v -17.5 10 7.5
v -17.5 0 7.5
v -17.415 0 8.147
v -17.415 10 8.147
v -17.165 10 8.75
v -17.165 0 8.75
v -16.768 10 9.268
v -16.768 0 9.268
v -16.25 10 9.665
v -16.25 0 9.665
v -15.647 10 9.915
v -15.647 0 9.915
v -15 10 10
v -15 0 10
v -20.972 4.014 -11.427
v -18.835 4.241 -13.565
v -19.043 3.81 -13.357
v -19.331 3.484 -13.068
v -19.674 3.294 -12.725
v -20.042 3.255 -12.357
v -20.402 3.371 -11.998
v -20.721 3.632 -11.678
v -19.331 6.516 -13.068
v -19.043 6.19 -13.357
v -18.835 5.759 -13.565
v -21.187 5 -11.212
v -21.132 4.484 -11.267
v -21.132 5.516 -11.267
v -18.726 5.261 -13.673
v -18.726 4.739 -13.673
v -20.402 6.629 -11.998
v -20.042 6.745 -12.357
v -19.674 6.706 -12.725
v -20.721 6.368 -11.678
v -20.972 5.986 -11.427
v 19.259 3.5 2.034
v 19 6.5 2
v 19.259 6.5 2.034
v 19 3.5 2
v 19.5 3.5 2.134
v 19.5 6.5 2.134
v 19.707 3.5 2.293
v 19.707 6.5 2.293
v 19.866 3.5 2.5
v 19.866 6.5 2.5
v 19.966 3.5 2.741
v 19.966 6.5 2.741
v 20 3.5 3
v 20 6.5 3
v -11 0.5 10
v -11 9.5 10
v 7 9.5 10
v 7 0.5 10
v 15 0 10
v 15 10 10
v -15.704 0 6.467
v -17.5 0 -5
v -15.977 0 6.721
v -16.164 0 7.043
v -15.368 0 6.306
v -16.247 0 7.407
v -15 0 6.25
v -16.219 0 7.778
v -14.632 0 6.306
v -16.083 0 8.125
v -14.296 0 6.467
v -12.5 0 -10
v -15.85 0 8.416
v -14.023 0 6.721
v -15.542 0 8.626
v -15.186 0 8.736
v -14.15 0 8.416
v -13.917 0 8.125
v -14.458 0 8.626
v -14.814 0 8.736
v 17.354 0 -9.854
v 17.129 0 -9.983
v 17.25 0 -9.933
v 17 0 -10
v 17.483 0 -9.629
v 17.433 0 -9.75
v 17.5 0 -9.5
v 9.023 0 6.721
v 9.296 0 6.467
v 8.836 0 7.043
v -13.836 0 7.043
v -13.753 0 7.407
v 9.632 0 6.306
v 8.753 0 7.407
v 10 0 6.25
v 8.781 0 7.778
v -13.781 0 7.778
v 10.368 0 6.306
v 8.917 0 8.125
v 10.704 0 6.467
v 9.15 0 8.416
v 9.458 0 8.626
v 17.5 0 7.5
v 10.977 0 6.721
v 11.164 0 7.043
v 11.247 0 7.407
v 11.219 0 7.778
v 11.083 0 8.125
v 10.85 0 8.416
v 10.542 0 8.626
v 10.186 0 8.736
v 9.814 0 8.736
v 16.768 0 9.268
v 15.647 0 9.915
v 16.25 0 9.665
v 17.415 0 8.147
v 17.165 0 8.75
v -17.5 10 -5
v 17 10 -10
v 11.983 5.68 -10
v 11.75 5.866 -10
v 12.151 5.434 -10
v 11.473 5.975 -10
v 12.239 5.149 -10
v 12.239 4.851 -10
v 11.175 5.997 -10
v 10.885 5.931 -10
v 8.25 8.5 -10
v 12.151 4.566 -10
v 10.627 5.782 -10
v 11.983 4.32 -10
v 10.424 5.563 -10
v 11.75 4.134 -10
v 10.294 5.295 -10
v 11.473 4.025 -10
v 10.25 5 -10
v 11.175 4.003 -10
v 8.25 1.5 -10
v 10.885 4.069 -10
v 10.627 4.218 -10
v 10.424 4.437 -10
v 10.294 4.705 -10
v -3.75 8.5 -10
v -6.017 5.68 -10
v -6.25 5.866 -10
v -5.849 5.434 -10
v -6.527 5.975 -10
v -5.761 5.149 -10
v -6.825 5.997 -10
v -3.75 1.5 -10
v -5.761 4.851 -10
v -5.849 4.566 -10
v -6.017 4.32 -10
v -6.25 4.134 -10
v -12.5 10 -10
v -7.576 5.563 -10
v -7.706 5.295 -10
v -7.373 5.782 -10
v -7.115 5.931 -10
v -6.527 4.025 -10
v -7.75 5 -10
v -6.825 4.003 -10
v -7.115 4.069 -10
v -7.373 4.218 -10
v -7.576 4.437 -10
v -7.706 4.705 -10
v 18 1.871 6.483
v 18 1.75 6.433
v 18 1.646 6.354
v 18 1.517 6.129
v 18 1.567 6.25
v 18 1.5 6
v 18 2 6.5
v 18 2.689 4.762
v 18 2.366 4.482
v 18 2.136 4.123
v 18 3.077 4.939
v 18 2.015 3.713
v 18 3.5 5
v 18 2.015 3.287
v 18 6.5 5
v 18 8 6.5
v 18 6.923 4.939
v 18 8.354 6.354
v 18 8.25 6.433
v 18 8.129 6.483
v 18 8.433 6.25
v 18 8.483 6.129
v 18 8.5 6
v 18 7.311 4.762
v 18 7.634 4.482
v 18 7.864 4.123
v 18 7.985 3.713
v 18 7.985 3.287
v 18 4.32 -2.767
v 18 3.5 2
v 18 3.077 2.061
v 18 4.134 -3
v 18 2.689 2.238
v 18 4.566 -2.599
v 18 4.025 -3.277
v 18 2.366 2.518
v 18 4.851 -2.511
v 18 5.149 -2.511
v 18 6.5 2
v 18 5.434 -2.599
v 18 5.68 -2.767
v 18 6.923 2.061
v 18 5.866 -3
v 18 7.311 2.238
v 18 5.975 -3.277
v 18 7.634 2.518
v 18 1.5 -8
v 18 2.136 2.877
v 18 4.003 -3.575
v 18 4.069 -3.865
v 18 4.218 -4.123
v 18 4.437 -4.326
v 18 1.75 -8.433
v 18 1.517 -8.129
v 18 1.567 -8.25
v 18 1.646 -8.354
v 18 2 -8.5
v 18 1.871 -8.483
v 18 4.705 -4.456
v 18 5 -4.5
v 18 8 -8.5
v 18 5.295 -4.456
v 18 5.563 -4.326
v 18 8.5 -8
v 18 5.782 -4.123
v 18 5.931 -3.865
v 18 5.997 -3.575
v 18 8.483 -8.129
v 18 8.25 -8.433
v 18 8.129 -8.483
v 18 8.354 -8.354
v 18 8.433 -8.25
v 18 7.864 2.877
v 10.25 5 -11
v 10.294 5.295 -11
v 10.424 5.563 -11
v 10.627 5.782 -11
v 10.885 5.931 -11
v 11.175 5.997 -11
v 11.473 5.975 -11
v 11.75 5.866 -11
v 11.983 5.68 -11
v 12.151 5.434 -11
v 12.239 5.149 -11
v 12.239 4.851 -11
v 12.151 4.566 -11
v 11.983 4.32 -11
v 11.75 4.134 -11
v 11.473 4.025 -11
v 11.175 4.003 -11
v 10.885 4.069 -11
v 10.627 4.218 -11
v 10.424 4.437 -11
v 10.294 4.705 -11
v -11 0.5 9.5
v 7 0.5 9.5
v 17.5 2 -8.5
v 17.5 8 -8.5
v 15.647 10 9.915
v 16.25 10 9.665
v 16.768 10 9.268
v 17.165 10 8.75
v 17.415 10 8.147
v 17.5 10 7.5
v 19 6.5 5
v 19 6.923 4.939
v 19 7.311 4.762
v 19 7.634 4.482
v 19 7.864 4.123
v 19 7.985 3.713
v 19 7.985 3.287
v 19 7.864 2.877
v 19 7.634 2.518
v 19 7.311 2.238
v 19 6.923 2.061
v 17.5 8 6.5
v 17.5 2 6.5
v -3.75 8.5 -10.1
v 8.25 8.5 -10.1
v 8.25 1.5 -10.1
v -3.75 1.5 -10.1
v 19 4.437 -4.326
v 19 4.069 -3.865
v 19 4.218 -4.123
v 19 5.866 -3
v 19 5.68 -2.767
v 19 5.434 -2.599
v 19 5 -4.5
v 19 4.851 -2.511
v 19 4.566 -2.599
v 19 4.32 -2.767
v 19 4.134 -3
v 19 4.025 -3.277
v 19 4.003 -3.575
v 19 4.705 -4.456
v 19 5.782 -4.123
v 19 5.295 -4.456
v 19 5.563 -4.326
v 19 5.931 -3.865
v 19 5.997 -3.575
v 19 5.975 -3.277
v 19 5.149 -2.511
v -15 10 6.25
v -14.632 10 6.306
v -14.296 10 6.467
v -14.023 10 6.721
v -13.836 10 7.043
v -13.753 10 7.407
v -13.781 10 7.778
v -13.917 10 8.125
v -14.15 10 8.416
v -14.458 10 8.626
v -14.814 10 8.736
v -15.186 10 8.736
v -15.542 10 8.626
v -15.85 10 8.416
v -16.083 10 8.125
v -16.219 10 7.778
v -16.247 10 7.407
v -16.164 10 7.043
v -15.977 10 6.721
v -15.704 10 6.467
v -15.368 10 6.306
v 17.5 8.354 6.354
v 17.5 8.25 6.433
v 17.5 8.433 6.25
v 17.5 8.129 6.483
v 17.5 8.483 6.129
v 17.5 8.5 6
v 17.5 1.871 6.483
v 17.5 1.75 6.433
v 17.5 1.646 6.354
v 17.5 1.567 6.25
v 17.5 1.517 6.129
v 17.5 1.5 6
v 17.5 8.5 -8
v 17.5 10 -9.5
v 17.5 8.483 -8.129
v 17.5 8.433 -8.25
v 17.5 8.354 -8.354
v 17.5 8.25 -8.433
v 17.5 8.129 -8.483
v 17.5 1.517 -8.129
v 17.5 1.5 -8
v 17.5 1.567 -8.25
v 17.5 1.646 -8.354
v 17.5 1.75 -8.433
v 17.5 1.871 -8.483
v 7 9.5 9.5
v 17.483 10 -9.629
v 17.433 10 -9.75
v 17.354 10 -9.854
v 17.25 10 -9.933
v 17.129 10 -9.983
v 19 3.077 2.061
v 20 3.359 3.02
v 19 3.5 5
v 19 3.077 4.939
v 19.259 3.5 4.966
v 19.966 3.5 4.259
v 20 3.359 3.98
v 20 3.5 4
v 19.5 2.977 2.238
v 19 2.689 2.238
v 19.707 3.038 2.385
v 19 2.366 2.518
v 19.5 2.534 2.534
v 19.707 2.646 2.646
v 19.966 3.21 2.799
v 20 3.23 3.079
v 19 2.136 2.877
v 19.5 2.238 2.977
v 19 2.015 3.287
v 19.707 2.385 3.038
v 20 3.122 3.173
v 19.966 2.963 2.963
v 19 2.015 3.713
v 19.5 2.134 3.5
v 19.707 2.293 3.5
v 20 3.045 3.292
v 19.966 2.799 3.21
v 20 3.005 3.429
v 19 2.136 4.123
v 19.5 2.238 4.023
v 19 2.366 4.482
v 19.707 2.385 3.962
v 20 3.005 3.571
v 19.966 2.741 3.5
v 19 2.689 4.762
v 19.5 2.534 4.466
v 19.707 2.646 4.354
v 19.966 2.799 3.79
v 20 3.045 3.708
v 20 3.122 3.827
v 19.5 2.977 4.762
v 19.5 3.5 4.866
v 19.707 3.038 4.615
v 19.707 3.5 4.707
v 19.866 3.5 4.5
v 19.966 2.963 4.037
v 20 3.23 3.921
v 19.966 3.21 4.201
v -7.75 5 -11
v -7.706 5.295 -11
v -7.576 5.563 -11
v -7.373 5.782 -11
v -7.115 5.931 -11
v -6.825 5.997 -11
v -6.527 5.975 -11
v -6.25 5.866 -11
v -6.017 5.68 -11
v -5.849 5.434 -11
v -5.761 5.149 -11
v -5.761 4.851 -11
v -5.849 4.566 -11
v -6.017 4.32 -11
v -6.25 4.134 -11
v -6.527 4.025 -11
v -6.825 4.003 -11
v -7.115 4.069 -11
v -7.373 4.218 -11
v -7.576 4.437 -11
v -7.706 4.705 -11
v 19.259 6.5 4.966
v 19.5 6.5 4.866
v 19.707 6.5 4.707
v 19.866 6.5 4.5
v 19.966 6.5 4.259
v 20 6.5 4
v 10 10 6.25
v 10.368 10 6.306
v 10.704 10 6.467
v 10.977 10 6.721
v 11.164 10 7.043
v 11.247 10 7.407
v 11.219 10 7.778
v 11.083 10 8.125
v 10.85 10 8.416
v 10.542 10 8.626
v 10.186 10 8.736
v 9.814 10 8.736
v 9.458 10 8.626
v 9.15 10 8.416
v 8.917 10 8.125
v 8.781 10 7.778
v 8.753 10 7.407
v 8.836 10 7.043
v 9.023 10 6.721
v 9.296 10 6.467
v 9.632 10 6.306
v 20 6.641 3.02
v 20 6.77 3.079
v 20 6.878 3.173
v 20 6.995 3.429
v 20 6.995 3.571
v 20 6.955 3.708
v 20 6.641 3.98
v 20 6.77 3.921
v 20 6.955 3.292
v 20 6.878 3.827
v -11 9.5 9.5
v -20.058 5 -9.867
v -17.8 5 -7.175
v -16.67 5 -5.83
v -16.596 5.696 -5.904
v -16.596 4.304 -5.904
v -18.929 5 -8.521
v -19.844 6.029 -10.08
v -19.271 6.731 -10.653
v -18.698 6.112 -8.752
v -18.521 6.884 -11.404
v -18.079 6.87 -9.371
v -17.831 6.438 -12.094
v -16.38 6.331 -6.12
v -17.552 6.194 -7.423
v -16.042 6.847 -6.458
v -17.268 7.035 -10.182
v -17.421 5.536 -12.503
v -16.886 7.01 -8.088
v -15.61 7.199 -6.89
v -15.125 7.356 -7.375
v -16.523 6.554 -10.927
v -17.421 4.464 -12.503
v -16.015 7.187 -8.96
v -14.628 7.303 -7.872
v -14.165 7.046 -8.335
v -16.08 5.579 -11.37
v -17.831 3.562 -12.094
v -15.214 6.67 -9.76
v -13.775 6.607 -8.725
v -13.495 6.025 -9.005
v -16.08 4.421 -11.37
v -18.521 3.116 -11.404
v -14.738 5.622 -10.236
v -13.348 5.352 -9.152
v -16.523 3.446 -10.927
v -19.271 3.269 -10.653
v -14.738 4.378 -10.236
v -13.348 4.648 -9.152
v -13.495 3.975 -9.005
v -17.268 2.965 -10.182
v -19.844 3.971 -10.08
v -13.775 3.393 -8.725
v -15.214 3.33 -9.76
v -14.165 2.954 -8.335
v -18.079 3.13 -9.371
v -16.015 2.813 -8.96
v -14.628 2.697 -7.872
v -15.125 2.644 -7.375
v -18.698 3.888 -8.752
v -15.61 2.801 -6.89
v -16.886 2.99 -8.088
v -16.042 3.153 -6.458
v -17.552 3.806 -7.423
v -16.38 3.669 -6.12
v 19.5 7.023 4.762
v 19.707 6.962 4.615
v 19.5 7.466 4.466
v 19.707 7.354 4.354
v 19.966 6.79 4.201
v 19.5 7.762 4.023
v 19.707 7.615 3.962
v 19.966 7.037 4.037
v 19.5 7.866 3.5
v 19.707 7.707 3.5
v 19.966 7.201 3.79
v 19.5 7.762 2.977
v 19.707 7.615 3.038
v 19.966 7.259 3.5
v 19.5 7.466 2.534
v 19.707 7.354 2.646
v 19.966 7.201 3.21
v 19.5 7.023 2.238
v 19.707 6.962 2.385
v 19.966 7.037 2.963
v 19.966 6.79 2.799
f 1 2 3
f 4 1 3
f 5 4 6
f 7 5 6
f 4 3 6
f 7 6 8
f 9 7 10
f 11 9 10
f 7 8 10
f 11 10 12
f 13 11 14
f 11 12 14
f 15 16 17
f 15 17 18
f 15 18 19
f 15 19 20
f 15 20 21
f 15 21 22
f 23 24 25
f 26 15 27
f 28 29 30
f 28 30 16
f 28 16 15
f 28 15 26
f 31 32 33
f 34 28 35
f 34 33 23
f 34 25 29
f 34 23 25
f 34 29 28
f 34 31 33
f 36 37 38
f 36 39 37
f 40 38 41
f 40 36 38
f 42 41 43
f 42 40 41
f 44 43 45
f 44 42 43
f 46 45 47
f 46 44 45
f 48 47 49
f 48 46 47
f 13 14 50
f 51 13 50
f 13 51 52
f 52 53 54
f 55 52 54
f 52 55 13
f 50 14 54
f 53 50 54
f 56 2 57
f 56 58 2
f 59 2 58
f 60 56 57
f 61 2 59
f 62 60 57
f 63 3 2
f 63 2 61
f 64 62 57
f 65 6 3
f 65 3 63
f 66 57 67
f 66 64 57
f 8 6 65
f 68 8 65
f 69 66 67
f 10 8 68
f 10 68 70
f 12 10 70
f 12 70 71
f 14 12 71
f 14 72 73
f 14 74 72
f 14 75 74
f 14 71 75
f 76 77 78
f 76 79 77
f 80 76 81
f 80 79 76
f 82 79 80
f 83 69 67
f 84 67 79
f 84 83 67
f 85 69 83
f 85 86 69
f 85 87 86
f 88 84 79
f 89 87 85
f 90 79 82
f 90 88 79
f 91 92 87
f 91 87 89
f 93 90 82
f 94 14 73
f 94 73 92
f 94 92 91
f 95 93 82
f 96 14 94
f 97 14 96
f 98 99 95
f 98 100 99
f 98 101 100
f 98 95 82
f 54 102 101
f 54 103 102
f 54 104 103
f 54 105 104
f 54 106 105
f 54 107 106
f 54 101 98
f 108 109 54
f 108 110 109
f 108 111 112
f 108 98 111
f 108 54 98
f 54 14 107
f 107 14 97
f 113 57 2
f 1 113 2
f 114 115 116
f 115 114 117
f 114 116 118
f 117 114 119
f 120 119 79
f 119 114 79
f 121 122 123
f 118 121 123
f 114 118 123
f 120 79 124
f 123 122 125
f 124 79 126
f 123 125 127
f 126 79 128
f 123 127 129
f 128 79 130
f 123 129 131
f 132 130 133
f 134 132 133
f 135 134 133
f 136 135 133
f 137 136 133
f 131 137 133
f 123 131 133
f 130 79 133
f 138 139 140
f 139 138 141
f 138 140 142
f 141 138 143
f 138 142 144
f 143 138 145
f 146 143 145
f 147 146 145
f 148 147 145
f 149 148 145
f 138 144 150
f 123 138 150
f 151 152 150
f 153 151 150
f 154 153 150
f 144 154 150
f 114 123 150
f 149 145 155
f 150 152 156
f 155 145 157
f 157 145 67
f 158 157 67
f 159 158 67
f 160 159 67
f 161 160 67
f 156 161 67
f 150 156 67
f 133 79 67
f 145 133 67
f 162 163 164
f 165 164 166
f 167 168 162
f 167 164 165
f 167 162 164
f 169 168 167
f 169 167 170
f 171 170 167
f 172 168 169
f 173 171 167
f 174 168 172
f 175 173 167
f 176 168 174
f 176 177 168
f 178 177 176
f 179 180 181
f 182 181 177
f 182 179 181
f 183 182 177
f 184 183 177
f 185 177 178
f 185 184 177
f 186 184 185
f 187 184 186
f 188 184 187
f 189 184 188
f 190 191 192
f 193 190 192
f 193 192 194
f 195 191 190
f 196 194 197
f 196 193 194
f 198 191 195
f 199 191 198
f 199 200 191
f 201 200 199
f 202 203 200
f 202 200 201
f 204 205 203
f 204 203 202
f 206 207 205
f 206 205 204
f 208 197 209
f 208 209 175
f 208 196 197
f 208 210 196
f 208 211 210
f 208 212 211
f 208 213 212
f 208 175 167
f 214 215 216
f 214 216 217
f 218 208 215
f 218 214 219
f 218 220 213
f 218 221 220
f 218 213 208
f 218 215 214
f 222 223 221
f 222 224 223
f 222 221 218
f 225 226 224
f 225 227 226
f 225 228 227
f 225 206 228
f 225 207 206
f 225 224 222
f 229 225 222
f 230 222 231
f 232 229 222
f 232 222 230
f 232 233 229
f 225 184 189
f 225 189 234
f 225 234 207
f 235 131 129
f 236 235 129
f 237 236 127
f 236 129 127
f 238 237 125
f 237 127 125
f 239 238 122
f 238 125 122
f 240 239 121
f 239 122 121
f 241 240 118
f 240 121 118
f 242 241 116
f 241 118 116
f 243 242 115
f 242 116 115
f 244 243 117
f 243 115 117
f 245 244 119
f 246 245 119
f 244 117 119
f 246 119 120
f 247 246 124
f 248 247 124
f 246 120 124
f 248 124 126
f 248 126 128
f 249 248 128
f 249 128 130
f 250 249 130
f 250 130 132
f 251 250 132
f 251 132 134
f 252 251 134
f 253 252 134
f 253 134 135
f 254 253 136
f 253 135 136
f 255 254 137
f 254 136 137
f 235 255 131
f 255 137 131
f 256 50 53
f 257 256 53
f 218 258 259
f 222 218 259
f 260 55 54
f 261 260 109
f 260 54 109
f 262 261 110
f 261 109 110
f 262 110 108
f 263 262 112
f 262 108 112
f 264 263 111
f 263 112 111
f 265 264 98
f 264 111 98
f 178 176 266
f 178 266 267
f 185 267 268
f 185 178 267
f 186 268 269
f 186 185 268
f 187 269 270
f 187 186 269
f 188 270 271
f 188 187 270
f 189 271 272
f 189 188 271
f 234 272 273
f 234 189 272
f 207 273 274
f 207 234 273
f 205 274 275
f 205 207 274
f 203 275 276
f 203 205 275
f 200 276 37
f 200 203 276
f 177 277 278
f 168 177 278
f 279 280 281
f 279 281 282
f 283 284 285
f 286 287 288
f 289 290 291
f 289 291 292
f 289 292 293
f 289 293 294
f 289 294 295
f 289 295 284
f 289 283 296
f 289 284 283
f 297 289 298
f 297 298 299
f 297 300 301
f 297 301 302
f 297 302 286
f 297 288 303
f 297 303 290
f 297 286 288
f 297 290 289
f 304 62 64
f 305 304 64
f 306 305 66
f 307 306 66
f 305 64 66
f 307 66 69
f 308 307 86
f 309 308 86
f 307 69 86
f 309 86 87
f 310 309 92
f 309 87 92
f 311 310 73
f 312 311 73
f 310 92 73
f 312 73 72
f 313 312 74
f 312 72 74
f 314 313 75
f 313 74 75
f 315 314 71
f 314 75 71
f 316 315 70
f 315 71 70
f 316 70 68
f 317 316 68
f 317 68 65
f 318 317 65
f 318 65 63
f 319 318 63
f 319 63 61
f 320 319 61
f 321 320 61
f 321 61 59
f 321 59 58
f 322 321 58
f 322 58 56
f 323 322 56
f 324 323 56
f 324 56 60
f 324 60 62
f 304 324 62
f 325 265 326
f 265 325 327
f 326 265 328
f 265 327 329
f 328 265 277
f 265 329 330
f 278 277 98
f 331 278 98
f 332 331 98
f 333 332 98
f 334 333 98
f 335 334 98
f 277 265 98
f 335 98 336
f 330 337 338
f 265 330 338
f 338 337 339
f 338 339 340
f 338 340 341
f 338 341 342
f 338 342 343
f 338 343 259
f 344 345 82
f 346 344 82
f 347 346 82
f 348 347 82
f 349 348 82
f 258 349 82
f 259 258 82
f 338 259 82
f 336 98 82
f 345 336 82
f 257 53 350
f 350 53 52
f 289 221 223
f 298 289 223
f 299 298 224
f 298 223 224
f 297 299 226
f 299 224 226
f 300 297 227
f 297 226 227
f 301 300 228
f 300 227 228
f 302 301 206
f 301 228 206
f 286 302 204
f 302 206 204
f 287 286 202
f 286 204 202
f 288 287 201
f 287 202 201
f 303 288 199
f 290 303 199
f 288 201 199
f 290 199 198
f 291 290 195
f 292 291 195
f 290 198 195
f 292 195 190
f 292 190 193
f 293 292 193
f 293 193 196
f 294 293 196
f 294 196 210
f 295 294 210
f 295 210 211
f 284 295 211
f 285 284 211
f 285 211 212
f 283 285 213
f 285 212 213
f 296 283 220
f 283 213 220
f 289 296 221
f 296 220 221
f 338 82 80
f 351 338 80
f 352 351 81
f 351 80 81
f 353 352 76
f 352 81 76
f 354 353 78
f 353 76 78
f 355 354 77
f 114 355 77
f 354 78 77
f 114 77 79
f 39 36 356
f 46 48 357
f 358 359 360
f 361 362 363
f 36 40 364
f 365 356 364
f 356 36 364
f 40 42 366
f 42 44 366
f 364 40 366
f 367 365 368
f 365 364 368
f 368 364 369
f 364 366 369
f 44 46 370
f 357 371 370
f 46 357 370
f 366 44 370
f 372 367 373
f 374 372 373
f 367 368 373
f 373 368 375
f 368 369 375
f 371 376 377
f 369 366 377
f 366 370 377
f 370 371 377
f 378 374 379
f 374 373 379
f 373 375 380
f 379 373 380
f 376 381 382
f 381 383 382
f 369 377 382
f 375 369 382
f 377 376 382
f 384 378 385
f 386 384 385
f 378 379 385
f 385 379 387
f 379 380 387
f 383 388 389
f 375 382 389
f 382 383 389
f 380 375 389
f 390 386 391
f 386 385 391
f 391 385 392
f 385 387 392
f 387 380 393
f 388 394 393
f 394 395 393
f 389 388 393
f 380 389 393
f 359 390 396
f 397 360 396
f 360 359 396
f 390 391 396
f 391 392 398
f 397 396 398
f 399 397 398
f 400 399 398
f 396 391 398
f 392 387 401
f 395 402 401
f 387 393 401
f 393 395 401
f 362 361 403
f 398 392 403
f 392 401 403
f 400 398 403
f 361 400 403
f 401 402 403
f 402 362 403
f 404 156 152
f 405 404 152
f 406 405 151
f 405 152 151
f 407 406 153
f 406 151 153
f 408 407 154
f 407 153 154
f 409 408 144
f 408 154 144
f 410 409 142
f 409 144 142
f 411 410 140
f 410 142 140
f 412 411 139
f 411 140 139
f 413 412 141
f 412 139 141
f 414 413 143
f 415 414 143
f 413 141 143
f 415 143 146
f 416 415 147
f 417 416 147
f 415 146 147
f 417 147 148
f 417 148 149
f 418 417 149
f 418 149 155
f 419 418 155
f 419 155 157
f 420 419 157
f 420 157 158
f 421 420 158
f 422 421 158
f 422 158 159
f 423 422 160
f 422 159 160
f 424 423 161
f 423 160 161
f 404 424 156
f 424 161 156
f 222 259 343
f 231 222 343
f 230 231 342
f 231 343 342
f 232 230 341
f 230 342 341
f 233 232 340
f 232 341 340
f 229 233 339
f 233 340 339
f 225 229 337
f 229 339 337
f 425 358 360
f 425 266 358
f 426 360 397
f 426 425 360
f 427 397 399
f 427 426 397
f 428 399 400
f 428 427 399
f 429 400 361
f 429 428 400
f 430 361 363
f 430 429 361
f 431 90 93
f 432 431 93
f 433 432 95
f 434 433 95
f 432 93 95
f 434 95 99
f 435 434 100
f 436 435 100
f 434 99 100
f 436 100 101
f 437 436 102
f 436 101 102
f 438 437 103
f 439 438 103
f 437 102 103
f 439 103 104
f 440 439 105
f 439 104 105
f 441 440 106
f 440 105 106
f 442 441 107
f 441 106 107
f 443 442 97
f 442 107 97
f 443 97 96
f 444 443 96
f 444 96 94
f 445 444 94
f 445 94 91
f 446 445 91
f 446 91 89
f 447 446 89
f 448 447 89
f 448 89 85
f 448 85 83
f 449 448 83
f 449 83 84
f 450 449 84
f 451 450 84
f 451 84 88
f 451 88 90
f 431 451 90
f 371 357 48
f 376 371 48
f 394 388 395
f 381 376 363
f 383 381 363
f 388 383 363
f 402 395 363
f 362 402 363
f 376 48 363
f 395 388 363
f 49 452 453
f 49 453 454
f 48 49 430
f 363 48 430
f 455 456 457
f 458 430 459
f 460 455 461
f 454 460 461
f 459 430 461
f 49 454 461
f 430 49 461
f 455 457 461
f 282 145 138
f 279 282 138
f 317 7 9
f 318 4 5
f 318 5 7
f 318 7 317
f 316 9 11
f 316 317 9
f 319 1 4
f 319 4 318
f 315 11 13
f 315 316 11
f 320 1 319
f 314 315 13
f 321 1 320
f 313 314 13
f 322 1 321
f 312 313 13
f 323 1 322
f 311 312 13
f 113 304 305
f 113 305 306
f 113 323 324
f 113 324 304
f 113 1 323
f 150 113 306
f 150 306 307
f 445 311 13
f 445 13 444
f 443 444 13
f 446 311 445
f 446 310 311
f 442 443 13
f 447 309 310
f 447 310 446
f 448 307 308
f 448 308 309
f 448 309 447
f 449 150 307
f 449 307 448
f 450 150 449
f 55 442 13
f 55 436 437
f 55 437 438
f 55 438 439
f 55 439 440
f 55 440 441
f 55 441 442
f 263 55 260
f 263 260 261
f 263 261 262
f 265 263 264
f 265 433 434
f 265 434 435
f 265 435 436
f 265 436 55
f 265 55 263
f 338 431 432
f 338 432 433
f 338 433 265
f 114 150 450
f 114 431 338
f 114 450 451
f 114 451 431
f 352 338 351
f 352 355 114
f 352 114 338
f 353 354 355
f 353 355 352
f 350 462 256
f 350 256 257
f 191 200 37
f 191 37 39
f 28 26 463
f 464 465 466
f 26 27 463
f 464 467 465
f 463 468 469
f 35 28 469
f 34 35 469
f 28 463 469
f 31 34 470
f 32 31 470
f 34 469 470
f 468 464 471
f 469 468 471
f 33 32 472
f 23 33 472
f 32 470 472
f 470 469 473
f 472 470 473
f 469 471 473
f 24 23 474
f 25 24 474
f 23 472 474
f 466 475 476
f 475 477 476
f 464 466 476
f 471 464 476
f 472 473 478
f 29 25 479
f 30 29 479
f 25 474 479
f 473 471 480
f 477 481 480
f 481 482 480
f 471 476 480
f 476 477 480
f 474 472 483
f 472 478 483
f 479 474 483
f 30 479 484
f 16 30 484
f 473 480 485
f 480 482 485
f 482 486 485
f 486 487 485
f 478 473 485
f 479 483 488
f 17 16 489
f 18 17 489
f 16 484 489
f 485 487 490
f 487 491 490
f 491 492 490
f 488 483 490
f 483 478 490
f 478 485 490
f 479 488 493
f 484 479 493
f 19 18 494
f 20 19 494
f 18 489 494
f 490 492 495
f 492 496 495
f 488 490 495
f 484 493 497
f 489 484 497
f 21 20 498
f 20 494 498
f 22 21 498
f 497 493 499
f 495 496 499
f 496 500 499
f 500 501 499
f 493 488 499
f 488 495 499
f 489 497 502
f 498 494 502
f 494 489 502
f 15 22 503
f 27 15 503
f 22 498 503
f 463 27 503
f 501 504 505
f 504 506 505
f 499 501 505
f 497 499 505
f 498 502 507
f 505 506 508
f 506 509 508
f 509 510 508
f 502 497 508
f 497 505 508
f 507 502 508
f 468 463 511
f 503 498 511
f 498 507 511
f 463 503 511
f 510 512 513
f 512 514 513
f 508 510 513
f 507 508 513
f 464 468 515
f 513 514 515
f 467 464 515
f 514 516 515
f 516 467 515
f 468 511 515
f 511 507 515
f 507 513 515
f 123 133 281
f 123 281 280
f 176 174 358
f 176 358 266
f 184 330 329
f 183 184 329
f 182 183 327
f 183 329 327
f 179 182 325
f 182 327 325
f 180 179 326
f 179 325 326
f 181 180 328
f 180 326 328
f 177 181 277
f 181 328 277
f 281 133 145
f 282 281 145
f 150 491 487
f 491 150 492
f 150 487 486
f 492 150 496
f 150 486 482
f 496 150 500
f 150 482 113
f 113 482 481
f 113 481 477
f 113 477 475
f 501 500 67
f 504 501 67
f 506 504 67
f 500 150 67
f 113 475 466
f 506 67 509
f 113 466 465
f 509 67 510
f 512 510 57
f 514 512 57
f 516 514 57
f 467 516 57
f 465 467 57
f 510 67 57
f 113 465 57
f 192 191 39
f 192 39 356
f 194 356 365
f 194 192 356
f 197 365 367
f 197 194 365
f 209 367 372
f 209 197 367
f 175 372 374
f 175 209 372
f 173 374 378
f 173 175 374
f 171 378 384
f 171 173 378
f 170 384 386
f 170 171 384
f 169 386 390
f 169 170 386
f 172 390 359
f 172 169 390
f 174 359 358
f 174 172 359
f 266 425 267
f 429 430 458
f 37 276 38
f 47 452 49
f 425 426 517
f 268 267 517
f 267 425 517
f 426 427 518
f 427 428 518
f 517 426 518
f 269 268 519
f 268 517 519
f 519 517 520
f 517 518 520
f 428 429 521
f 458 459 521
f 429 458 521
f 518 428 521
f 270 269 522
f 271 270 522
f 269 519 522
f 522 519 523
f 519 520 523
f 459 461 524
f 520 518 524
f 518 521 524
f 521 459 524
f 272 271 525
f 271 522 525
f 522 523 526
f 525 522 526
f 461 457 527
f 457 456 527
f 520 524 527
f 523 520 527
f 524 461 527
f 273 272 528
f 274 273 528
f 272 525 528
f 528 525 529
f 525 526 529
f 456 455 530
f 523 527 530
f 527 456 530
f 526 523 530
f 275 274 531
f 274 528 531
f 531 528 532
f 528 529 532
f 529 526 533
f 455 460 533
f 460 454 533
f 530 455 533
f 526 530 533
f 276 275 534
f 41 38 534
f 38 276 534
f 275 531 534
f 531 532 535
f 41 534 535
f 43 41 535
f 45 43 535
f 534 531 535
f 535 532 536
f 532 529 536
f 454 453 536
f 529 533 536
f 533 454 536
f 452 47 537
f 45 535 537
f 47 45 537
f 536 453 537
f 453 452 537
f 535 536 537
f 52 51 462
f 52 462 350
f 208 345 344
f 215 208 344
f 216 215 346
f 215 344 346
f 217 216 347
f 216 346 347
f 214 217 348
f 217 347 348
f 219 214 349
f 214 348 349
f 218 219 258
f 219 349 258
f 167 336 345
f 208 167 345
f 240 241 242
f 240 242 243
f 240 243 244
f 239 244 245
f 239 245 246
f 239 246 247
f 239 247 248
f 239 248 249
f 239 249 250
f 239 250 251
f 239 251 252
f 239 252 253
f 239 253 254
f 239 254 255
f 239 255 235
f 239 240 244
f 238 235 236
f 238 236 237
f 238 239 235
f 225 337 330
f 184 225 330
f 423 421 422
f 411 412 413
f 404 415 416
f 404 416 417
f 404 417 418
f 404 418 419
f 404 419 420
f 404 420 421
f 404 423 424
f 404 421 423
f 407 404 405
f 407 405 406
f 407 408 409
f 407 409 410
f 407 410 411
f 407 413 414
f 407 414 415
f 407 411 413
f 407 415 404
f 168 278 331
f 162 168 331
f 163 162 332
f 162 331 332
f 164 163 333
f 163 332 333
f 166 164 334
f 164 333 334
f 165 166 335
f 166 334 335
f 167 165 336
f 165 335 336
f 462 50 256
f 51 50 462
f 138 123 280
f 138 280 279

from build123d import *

# Parameters (mm, degrees)
SKETCH_1_R             = 0.5
EXTRUDE_1_DEPTH        = 10
HOLE_WIZARD_M3_1_D     = 2.5
HOLE_WIZARD_M3_1_DEPTH = 18.5
HOLE_WIZARD_M3_1_TIP   = 0.751075774
SKETCH_4_R             = 0.5
EXTRUDE_2_DEPTH        = 10
HOLE_WIZARD_M3_2_D     = 2.5
HOLE_WIZARD_M3_2_DEPTH = 18.5
HOLE_WIZARD_M3_2_TIP   = 0.751075774
SKETCH_6_W             = 18
SKETCH_6_H             = 9
CUT_EXTRUDE_1_DEPTH    = 0.5
EXTRUDE_3_DEPTH        = 0.5
EXTRUDE_4_DEPTH        = 2
FILLET_4_R             = 1
SKETCH_10_R            = 1
EXTRUDE_5_DEPTH        = 1
SKETCH_11_W            = 12
SKETCH_11_H            = 7
EXTRUDE_6_DEPTH        = 0.1
SKETCH_12_R            = 1
EXTRUDE_7_DEPTH        = 1
SKETCH_13_R            = 1.75
EXTRUDE_8_DEPTH        = 7
DRAFT_1_ANGLE          = 5


with BuildPart() as part:
    # 草图1 → 凸台-拉伸1 (new body)
    with BuildSketch(Plane(origin=(0, 0, 0), x_dir=(1, 0, 0), z_dir=(0, 1, 0))):
        with BuildLine():
            Line((-12.5, 10), (-17.5, 5))
            Line((-17.5, 5), (-17.5, -7.5))
            ThreePointArc((-17.5, -7.5), (-16.767766953, -9.267766953), (-15, -10))
            Line((-15, -10), (15, -10))
            ThreePointArc((15, -10), (16.767766953, -9.267766953), (17.5, -7.5))
            Line((17.5, -7.5), (17.5, 9.5))
            ThreePointArc((17.5, 9.5), (17.353553391, 9.853553391), (17, 10))
            Line((17, 10), (-12.5, 10))
        make_face()
        with Locations((-15, -7.5)):
            Circle(SKETCH_1_R, mode=Mode.SUBTRACT)
    extrude(amount=EXTRUDE_1_DEPTH)

    # M3 螺纹孔1
    with Locations(Plane(origin=(10, 10, 7.5), x_dir=(0, 0, 1), z_dir=(0, 1, 0))):
        with Locations((0, 0)):
            Hole(HOLE_WIZARD_M3_1_D / 2, depth=HOLE_WIZARD_M3_1_DEPTH)
            with Locations((0, 0, -(HOLE_WIZARD_M3_1_DEPTH + HOLE_WIZARD_M3_1_TIP / 2))):  # 118° drill point
                Cone(0, HOLE_WIZARD_M3_1_D / 2, HOLE_WIZARD_M3_1_TIP, mode=Mode.SUBTRACT)

    # 草图4 → 凸台-拉伸2 (add)
    with BuildSketch(Plane.XZ):
        with Locations((-15, 7.5)):
            Circle(SKETCH_4_R)
    extrude(amount=-EXTRUDE_2_DEPTH)

    # M3 螺纹孔2
    with Locations(Plane(origin=(-15, 10, 7.5), x_dir=(0, 0, 1), z_dir=(0, 1, 0))):
        with Locations((0, 0)):
            Hole(HOLE_WIZARD_M3_2_D / 2, depth=HOLE_WIZARD_M3_2_DEPTH)
            with Locations((0, 0, -(HOLE_WIZARD_M3_2_DEPTH + HOLE_WIZARD_M3_2_TIP / 2))):  # 118° drill point
                Cone(0, HOLE_WIZARD_M3_2_D / 2, HOLE_WIZARD_M3_2_TIP, mode=Mode.SUBTRACT)

    # 草图6 → 切除-拉伸1 (cut)
    with BuildSketch(Plane.XY.offset(10)):
        with Locations((-2, 5)):
            Rectangle(SKETCH_6_W, SKETCH_6_H)
    extrude(amount=-CUT_EXTRUDE_1_DEPTH, mode=Mode.SUBTRACT)

    # 草图8 → 凸台-拉伸3 (add)
    with BuildSketch(Plane(origin=(17.5, 0, 0), x_dir=(0, 0, -1), z_dir=(1, 0, 0))):
        with BuildLine():
            Line((8, 8.5), (-6, 8.5))
            ThreePointArc((-6, 8.5), (-6.353553391, 8.353553391), (-6.5, 8))
            Line((-6.5, 8), (-6.5, 2))
            ThreePointArc((-6.5, 2), (-6.353553391, 1.646446609), (-6, 1.5))
            Line((-6, 1.5), (8, 1.5))
            ThreePointArc((8, 1.5), (8.353553391, 1.646446609), (8.5, 2))
            Line((8.5, 2), (8.5, 8))
            ThreePointArc((8.5, 8), (8.353553391, 8.353553391), (8, 8.5))
        make_face()
    extrude(amount=EXTRUDE_3_DEPTH)

    # 草图9 → 凸台-拉伸4 (add)
    with BuildSketch(Plane(origin=(18, 0, 0), x_dir=(0, 0, -1), z_dir=(1, 0, 0))):
        with BuildLine():
            Line((-2, 6.5), (-2, 3.5))
            ThreePointArc((-2, 3.5), (-3.5, 2), (-5, 3.5))
            Line((-5, 3.5), (-5, 6.5))
            ThreePointArc((-5, 6.5), (-3.5, 8), (-2, 6.5))
        make_face()
    extrude(amount=EXTRUDE_4_DEPTH)

    # 圆角4
    fillet_4_edges = [part.edges().sort_by_distance(p)[0] for p in [
        (20, 8, 3.5),
        (20, 5, 5),
        (20, 2, 3.5),
        (20, 5, 2),
    ]]
    fillet(fillet_4_edges, radius=FILLET_4_R)

    # 草图10 → 凸台-拉伸5 (add)
    with BuildSketch(Plane(origin=(18, 0, 0), x_dir=(0, 0, -1), z_dir=(1, 0, 0))):
        with Locations((3.5, 5)):
            Circle(SKETCH_10_R)
    extrude(amount=EXTRUDE_5_DEPTH)

    # 草图11 → 凸台-拉伸6 (add)
    with BuildSketch(Plane(origin=(0, 0, -10), x_dir=(-1, 0, 0), z_dir=(0, 0, -1))):
        with Locations((-2.25, 5)):
            Rectangle(SKETCH_11_W, SKETCH_11_H)
    extrude(amount=EXTRUDE_6_DEPTH)

    # 草图12 → 凸台-拉伸7 (add)
    with BuildSketch(Plane(origin=(0, 0, -10), x_dir=(-1, 0, 0), z_dir=(0, 0, -1))):
        with Locations((-11.25, 5)):
            Circle(SKETCH_12_R)
        with Locations((6.75, 5)):
            Circle(SKETCH_12_R)
    extrude(amount=EXTRUDE_7_DEPTH)

    # 草图13 → 凸台-拉伸8 (add)
    with BuildSketch(Plane(origin=(-11.25, 0, -11.25), x_dir=(-0.707106781, 0, 0.707106781), z_dir=(-0.707106781, 0, -0.707106781))):
        with Locations((5.303300859, 5)):
            Circle(SKETCH_13_R)
    extrude(amount=EXTRUDE_8_DEPTH)

    # 拔模1
    draft_1_faces = [part.faces().sort_by_distance(p)[0] for p in [
        (-16.237436867, 5, -11.212310601),
    ]]
    draft(draft_1_faces, Plane(origin=(-19.949747468, 5, -12.449747468), x_dir=(-0.707106781, 0, 0.707106781), z_dir=(-0.707106781, 0, -0.707106781)), DRAFT_1_ANGLE)


solid = part.part
